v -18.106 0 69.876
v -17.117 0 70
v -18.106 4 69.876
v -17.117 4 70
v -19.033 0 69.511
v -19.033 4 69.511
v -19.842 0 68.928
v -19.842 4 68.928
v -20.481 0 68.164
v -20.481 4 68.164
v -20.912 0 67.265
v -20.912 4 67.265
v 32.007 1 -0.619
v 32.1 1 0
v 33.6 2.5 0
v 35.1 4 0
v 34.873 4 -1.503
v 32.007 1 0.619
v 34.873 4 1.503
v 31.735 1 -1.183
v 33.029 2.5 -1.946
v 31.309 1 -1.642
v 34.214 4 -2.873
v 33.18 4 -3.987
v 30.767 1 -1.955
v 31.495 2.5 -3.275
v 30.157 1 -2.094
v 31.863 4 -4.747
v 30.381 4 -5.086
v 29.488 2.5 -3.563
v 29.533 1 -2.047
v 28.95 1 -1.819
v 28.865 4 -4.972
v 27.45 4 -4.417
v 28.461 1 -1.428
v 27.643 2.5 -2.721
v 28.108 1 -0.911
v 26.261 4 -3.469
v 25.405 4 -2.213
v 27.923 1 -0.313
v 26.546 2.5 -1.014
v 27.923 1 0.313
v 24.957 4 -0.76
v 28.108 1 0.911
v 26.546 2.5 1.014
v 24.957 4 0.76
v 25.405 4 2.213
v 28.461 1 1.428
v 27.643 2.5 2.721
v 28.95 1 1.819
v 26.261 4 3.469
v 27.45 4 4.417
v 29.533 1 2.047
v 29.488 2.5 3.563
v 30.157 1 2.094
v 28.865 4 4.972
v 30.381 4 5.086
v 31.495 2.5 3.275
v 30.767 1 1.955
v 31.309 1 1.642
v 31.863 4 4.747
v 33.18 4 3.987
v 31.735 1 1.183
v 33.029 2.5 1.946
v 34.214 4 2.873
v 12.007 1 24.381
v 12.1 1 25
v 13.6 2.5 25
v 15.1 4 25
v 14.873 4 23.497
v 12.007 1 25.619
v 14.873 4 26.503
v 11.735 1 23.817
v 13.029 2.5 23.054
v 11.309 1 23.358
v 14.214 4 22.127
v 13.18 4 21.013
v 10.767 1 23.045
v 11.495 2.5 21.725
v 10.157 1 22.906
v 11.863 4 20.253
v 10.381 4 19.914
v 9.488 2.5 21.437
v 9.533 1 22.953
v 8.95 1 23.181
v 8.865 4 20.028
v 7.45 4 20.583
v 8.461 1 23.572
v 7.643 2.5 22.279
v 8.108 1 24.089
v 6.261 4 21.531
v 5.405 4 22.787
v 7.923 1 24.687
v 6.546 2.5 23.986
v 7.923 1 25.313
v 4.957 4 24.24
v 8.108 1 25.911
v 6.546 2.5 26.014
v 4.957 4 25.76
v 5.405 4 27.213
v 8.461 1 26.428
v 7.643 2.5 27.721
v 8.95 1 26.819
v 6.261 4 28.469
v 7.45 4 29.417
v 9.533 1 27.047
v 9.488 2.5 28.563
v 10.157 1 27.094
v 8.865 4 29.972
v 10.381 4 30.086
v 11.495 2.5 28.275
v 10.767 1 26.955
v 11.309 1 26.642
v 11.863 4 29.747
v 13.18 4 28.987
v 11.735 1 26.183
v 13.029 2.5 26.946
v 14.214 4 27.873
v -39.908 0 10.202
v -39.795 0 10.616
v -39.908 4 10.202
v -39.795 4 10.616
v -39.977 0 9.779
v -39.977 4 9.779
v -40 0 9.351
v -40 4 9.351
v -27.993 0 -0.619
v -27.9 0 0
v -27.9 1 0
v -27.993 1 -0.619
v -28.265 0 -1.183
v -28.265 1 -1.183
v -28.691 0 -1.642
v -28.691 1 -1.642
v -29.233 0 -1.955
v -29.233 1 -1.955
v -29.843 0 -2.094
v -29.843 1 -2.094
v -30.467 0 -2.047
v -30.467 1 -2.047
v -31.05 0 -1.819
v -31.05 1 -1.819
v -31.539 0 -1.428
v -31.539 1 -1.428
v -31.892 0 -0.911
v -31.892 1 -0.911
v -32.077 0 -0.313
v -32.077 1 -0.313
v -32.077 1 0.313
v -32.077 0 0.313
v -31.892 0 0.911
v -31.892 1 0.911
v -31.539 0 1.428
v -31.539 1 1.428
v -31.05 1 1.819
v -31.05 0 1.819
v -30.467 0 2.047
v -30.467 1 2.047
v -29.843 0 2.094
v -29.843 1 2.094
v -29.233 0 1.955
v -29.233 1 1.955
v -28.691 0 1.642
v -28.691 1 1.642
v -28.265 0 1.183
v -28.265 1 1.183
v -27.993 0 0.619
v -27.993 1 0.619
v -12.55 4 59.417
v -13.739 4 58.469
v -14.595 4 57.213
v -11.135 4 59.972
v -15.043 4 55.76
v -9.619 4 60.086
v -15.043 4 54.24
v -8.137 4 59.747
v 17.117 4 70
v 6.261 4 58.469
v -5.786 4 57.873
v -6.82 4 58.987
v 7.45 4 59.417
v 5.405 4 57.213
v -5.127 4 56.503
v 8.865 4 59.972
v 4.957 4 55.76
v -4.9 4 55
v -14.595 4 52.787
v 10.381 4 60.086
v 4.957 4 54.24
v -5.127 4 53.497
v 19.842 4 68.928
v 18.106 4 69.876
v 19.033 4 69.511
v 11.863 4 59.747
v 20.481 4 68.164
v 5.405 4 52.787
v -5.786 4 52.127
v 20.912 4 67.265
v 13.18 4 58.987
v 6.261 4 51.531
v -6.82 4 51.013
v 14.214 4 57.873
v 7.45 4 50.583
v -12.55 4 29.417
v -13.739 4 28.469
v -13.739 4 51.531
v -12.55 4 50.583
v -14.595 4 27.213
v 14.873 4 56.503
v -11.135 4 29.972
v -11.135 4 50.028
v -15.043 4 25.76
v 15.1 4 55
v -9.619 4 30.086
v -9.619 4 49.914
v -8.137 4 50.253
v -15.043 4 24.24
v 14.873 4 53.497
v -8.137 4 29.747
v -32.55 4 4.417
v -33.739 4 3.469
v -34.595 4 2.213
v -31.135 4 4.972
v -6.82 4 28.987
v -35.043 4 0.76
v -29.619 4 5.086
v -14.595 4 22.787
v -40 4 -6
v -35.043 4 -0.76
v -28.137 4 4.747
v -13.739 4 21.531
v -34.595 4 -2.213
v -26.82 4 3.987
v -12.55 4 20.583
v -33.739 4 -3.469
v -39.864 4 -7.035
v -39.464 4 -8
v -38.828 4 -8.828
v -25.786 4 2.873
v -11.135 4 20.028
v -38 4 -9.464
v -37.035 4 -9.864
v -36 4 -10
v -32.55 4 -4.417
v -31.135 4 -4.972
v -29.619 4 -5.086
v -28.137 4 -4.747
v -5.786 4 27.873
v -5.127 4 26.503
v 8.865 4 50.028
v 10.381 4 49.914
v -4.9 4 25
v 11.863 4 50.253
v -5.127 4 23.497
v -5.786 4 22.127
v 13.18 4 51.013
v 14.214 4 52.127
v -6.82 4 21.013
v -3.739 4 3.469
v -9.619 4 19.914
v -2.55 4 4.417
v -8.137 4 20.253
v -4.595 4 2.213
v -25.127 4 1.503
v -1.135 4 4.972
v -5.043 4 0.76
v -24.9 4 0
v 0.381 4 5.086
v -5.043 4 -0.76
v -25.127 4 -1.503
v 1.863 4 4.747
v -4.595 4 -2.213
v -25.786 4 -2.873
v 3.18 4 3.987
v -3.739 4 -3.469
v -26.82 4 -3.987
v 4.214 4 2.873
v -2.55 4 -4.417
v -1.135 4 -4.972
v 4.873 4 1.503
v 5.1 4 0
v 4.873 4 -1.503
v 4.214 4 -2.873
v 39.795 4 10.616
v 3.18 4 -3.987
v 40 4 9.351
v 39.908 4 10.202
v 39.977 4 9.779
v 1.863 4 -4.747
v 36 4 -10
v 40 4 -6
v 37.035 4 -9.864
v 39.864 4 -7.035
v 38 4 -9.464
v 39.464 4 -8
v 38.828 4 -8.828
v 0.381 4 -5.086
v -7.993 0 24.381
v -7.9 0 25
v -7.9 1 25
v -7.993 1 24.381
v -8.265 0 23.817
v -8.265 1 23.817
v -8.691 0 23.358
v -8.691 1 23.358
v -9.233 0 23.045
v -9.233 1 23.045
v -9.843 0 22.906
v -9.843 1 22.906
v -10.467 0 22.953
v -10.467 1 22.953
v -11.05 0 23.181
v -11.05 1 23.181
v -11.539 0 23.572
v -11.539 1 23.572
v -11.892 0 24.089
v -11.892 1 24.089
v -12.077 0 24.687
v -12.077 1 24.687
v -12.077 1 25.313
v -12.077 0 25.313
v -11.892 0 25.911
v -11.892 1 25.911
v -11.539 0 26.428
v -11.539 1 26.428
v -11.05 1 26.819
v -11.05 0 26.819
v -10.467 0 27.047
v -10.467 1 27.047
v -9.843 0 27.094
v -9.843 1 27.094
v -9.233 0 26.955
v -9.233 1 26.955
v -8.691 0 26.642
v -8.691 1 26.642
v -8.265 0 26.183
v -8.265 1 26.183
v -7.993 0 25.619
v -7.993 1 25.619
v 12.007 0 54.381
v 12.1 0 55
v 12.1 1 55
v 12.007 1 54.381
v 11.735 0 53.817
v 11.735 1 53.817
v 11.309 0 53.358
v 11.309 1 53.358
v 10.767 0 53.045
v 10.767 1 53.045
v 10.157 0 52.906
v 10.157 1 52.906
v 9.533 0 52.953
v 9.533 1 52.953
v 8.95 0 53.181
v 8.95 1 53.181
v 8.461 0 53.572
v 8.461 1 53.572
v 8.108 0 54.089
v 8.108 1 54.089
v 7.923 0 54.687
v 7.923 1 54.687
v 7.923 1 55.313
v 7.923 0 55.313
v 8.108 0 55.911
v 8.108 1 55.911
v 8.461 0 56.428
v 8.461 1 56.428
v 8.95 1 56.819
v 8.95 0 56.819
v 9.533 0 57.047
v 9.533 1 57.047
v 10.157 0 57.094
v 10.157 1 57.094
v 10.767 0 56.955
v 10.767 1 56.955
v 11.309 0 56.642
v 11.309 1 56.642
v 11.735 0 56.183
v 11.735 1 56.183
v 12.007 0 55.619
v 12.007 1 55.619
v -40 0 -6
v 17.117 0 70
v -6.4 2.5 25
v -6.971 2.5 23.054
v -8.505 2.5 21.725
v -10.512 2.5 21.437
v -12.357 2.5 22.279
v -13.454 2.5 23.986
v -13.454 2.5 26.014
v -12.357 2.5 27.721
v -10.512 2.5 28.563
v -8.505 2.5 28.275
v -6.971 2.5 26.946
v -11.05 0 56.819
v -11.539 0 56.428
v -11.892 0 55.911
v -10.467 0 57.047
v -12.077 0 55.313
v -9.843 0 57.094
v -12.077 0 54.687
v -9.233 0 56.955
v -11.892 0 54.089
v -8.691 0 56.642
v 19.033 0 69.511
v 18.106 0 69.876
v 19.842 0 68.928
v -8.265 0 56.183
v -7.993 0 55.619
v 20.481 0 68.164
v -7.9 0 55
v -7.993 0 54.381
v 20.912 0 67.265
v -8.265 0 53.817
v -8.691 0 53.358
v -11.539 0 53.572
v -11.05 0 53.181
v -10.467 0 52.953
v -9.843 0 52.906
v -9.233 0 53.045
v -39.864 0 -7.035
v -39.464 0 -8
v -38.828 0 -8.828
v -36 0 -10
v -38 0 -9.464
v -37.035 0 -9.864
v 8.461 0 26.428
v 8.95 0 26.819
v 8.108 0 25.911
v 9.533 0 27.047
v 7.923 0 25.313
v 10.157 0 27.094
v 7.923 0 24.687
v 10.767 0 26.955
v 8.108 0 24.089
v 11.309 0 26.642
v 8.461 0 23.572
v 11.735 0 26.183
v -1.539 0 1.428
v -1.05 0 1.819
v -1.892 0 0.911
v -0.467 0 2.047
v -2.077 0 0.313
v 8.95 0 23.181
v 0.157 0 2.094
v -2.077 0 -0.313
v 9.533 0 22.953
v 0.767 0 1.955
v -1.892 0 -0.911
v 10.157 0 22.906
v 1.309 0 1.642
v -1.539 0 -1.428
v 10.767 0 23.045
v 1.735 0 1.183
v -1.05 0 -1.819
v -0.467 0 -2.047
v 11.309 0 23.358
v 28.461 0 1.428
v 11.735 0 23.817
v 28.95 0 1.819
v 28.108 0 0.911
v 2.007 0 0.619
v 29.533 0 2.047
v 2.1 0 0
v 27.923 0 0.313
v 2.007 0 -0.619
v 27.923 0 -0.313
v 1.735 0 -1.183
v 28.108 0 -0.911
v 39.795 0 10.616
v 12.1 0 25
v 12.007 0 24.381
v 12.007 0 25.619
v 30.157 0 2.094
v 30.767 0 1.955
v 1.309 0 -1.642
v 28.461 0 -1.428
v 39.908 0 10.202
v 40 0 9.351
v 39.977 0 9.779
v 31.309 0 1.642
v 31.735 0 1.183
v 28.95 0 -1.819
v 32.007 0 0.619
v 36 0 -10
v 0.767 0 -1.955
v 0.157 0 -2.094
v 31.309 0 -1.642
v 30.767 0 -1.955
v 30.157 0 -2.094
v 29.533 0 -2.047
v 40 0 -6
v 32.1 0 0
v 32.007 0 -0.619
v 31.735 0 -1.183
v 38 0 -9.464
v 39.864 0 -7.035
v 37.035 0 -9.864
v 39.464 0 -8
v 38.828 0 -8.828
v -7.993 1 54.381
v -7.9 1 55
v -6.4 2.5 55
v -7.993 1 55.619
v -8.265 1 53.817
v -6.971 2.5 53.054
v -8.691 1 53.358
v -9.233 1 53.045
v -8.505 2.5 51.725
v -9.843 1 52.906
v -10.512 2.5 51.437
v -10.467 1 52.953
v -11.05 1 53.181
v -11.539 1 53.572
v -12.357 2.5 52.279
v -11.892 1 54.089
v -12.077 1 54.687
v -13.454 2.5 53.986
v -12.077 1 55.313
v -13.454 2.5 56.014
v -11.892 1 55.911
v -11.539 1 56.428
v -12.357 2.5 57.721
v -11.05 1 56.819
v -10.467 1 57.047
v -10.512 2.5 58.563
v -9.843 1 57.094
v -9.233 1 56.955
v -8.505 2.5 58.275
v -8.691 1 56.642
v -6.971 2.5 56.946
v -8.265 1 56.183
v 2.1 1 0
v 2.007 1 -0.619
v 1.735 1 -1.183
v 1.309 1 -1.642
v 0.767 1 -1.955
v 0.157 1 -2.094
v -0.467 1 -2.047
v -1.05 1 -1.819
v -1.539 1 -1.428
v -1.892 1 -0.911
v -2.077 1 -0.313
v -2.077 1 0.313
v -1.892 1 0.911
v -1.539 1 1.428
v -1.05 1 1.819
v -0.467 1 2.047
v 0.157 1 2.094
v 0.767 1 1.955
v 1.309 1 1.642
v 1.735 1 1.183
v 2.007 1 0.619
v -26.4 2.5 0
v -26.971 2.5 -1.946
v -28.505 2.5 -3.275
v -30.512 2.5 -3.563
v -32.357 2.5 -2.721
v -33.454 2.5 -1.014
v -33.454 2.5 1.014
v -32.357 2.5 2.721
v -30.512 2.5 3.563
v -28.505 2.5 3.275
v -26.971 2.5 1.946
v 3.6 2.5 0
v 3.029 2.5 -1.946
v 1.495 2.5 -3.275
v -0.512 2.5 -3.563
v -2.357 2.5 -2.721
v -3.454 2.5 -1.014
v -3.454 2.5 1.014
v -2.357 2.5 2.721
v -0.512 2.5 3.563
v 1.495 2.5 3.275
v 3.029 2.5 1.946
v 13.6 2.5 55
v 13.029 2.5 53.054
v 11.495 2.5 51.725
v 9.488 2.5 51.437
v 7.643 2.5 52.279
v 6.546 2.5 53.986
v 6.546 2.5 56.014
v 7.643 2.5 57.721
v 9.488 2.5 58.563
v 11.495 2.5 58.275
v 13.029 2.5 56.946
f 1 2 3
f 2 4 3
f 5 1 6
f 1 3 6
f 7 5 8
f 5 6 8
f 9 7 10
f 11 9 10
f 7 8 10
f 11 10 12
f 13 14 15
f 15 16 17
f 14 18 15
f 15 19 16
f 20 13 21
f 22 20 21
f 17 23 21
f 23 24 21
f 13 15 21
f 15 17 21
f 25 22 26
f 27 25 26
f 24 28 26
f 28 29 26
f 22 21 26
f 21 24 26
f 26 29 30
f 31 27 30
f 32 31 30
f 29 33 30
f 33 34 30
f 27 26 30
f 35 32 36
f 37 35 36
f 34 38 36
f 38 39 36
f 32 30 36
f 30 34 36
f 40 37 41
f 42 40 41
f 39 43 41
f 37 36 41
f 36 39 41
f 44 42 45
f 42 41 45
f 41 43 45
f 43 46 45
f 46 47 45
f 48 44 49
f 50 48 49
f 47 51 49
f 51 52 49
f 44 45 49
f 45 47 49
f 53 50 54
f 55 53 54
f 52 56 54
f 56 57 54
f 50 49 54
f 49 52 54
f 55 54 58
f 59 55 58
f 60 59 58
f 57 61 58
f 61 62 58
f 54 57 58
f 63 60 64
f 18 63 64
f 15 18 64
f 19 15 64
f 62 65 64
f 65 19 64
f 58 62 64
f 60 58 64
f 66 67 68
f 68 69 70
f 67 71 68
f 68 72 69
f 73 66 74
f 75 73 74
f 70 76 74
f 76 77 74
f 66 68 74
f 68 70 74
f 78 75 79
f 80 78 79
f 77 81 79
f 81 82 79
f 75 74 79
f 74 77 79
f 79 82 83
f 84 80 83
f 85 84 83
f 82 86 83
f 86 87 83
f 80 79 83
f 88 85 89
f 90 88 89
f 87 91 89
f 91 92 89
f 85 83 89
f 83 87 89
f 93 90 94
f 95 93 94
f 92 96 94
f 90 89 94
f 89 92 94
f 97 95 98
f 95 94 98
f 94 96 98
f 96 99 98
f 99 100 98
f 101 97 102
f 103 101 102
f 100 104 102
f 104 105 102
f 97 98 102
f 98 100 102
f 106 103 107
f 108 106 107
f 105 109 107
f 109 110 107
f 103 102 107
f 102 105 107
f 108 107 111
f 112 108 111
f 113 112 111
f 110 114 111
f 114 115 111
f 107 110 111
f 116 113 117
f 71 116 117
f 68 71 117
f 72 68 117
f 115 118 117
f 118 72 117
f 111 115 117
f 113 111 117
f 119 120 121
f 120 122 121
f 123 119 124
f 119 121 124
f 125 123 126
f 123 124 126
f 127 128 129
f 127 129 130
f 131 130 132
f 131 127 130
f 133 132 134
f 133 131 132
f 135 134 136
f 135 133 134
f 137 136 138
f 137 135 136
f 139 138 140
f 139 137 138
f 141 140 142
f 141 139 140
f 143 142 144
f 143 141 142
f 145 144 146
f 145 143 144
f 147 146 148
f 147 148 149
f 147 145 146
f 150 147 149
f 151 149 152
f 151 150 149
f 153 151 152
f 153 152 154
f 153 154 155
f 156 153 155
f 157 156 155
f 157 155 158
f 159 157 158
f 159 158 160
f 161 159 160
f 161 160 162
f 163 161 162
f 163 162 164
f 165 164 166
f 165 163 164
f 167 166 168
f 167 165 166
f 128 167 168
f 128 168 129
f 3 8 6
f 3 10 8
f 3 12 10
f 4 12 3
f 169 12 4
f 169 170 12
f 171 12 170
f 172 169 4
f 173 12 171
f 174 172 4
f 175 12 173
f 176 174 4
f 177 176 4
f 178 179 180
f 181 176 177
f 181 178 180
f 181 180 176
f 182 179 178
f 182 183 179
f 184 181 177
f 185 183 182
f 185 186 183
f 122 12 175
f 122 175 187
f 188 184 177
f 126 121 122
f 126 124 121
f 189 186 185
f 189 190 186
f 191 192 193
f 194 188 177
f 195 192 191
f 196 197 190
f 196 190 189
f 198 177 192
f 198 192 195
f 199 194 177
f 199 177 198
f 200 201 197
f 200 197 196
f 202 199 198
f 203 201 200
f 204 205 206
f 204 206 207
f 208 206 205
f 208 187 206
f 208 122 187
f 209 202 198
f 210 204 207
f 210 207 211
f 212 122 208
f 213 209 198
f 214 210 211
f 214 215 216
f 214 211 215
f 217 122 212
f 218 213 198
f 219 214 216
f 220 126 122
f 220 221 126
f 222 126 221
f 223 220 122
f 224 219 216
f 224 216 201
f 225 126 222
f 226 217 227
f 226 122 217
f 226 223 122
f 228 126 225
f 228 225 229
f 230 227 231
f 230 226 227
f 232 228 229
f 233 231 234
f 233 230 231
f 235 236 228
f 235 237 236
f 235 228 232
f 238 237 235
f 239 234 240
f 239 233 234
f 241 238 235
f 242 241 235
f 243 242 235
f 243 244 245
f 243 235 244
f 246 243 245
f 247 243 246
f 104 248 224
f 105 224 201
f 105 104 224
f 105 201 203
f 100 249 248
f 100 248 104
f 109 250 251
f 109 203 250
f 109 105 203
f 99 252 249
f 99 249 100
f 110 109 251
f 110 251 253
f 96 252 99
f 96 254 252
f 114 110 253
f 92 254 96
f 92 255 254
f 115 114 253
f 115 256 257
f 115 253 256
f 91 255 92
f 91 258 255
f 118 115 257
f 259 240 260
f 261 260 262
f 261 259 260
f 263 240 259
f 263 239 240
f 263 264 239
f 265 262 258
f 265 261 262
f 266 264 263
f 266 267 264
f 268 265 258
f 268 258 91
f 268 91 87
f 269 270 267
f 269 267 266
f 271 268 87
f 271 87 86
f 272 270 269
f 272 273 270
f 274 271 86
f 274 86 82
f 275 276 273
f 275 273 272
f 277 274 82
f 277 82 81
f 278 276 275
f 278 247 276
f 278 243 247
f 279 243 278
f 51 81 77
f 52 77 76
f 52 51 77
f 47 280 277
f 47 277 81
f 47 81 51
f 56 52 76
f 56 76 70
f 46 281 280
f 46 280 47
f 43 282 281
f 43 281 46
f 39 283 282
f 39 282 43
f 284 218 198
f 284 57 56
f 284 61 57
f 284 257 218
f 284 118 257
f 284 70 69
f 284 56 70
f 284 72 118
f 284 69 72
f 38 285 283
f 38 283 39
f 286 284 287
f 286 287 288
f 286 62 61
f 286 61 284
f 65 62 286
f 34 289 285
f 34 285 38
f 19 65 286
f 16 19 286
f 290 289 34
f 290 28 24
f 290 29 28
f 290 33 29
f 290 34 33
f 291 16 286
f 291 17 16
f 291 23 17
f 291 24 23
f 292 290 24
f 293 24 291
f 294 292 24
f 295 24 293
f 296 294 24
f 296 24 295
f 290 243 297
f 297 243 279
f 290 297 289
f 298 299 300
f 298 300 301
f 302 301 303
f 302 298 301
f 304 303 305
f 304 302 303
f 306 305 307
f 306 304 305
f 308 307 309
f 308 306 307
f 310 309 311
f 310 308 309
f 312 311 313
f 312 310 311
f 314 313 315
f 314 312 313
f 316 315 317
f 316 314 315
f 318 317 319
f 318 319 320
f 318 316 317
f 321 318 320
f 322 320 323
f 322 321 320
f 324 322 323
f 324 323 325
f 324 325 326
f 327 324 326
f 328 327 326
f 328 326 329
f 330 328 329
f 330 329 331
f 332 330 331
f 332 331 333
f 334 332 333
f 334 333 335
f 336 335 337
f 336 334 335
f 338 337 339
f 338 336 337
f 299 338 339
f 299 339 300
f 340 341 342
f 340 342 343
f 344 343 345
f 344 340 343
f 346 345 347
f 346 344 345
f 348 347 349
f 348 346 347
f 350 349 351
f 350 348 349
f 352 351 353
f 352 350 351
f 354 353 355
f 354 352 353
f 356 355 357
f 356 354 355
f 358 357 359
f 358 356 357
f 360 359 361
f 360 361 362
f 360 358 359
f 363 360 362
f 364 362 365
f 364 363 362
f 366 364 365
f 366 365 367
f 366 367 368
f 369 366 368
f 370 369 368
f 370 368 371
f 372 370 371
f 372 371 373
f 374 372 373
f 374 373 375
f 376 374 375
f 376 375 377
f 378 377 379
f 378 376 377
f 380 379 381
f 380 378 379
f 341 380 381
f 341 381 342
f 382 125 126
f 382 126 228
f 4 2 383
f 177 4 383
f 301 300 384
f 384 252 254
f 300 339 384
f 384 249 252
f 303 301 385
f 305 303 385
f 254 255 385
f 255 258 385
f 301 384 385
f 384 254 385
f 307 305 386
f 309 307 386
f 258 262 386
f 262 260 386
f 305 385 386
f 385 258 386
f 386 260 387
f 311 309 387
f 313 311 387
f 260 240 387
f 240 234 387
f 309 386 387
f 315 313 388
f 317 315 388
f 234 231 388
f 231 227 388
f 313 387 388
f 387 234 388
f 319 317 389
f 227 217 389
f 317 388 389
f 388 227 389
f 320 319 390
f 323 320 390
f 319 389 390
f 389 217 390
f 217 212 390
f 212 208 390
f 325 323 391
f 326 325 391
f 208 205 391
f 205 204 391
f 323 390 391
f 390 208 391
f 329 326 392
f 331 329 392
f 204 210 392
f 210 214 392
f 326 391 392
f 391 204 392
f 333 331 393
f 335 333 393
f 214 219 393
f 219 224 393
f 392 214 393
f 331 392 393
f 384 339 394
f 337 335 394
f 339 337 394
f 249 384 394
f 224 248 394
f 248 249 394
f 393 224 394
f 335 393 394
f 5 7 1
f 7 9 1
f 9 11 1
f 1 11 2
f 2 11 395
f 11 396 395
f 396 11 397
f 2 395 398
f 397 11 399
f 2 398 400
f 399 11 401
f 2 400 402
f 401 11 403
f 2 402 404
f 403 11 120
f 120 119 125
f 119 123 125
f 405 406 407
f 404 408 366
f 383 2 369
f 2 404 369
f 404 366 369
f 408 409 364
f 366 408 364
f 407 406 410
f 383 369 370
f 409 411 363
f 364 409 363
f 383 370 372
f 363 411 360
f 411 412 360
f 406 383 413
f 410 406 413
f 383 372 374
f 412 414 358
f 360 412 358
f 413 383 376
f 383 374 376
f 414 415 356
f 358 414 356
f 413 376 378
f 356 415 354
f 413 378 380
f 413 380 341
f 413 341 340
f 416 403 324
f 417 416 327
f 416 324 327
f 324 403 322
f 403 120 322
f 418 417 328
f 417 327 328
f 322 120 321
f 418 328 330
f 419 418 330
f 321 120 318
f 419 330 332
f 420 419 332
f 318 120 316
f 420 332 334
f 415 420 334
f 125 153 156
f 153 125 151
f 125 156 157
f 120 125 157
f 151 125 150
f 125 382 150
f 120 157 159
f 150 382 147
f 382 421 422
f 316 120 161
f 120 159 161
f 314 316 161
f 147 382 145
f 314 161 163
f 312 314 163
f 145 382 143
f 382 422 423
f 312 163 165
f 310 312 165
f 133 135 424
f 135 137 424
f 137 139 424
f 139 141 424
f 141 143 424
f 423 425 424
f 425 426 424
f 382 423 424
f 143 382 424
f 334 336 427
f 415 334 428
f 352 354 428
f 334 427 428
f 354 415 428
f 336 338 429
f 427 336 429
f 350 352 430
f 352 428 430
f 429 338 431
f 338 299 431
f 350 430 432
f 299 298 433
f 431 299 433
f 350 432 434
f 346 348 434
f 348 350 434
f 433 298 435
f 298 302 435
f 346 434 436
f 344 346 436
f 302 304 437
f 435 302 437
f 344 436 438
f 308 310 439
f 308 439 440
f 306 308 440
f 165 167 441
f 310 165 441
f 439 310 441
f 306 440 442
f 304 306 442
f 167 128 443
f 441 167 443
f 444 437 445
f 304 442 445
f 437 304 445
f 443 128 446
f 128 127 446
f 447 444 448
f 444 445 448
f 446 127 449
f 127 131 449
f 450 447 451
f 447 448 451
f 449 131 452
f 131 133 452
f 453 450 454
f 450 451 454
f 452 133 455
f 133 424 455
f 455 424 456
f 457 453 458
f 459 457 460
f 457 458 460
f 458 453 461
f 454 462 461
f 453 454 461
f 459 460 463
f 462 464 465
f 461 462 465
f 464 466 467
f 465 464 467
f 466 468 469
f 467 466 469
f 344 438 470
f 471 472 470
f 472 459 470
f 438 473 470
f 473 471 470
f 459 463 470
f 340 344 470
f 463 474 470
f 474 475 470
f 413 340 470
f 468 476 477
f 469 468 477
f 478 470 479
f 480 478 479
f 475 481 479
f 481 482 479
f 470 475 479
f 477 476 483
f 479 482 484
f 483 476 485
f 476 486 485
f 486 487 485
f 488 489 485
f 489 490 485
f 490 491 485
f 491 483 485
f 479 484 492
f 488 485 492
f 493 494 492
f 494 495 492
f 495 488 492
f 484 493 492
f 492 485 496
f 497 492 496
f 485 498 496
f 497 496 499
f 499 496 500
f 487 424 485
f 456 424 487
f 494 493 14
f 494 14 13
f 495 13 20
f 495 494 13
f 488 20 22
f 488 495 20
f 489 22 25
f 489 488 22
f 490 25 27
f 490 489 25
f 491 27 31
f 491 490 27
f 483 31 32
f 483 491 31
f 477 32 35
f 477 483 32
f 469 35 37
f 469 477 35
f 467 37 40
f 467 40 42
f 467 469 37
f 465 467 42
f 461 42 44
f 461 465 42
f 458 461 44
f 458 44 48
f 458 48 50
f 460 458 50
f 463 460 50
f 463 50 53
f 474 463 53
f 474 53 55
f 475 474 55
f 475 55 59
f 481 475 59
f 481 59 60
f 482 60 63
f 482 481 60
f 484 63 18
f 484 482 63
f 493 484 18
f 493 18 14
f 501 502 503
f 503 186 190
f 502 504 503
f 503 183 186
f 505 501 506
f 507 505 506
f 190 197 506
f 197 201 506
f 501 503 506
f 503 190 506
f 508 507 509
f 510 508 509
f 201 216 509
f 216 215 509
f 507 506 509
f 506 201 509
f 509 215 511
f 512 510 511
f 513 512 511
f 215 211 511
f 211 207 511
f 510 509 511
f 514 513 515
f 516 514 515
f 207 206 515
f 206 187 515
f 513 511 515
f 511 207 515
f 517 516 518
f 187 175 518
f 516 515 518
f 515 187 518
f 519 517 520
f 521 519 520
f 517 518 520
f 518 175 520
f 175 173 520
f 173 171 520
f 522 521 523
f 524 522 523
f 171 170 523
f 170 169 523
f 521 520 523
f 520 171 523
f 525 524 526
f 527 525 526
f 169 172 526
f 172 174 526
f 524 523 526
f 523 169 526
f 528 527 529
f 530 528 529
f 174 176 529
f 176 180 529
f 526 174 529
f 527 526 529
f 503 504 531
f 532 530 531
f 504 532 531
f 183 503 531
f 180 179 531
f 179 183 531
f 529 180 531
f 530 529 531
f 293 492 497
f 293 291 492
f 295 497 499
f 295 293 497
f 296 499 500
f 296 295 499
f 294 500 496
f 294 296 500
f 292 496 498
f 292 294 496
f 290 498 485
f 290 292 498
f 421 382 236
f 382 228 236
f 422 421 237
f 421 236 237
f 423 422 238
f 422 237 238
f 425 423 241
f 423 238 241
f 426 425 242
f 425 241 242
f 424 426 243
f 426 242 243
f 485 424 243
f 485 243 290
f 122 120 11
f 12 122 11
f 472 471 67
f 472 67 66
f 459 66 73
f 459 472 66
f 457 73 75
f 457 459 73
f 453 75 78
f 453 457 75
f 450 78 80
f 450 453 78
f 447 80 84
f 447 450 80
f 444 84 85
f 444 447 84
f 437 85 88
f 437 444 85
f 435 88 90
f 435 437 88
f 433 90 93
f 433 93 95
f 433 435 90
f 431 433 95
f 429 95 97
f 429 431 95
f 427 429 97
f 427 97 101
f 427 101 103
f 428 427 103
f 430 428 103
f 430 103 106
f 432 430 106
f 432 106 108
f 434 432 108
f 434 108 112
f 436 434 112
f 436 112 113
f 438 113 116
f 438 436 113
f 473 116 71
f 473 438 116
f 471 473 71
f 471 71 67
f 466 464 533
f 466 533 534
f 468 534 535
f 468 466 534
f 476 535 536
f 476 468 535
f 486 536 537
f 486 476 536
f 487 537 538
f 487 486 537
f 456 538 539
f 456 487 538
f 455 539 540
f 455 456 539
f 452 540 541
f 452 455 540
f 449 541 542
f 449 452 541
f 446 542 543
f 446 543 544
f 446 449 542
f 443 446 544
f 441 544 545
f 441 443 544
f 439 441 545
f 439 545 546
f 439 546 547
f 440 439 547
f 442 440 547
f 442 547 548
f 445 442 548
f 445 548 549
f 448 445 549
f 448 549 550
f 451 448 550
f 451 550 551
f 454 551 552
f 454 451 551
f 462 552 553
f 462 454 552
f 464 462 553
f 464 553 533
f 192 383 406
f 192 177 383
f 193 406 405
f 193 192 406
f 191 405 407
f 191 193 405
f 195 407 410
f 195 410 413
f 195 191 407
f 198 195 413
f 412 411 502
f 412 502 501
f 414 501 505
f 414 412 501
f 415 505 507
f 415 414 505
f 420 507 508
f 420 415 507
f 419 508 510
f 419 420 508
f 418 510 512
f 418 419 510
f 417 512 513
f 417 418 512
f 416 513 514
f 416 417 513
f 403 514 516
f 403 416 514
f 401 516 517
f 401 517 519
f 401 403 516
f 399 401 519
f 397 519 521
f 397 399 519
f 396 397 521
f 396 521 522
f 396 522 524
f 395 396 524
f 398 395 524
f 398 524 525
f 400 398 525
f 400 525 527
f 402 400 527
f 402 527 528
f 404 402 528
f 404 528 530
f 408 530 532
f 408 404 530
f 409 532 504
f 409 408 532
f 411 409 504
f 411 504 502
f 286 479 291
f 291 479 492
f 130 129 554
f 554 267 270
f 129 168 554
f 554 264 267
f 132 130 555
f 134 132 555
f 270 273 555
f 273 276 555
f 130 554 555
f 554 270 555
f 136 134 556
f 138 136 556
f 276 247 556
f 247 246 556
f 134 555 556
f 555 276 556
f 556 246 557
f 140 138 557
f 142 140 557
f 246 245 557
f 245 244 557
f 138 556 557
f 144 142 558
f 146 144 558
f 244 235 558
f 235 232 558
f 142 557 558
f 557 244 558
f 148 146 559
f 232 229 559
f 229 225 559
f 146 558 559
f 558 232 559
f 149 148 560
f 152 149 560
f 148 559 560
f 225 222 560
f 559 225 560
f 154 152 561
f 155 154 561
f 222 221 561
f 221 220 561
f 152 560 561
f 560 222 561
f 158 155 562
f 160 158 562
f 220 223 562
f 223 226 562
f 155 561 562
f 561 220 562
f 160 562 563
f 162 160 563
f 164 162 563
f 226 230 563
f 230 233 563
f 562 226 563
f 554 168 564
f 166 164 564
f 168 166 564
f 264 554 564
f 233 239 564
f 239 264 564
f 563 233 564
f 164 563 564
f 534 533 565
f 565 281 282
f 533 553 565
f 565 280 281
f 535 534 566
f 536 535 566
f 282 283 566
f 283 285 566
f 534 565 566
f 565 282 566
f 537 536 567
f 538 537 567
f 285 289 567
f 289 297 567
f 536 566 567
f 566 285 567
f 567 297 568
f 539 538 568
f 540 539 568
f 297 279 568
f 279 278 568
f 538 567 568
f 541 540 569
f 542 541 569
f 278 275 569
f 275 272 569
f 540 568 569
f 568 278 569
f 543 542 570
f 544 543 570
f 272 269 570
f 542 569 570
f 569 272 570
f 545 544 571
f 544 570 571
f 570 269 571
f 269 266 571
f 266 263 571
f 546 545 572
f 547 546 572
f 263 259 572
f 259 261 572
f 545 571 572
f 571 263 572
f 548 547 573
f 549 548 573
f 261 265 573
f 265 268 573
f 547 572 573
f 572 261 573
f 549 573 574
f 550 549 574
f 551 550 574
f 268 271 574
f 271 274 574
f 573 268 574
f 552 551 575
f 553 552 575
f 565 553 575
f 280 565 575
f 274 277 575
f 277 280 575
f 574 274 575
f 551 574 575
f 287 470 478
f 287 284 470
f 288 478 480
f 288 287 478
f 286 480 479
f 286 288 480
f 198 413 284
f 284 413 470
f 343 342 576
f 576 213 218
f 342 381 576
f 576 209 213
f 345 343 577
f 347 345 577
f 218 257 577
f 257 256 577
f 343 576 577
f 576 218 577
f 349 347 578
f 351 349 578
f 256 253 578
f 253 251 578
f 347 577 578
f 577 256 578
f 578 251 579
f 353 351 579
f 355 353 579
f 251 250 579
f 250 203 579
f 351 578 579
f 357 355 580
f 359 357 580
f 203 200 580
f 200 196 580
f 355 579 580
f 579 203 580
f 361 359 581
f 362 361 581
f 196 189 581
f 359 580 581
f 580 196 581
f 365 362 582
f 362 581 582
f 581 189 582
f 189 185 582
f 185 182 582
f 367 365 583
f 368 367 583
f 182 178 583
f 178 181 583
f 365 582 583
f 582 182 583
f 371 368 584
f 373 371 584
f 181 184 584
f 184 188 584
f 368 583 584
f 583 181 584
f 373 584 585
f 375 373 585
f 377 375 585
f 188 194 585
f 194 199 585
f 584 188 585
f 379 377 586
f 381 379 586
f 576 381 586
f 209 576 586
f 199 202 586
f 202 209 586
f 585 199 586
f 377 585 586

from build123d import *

# Parameters (mm, degrees)
SKETCH1_W           = 40
SKETCH1_H           = 60
SKETCH1_R           = 2.1
SKETCH1_W_2         = 80
SKETCH1_H_2         = 20
BOSS_EXTRUDE1_DEPTH = 4
CHAMFER1_SIZE       = 3
FILLET1_R           = 4


with BuildPart() as part:
    # Sketch1 → Boss-Extrude1 (new body)
    with BuildSketch(Plane(origin=(0, 0, 0), x_dir=(1, 0, 0), z_dir=(0, 1, 0))):
        with Locations((0, -40)):
            Rectangle(SKETCH1_W, SKETCH1_H)
        with Locations((-10, -55)):
            Circle(SKETCH1_R, mode=Mode.SUBTRACT)
        with Locations((10, -55)):
            Circle(SKETCH1_R, mode=Mode.SUBTRACT)
        with Locations((-10, -25)):
            Circle(SKETCH1_R, mode=Mode.SUBTRACT)
        with Locations((10, -25)):
            Circle(SKETCH1_R, mode=Mode.SUBTRACT)
        Polygon((-20, -10), (-40, -10), (-20, -70), align=None)
        Polygon((40, -10), (20, -10), (20, -70), align=None)
        Rectangle(SKETCH1_W_2, SKETCH1_H_2)
        Circle(SKETCH1_R, mode=Mode.SUBTRACT)
        with Locations((30, 0)):
            Circle(SKETCH1_R, mode=Mode.SUBTRACT)
        with Locations((-30, 0)):
            Circle(SKETCH1_R, mode=Mode.SUBTRACT)
    extrude(amount=BOSS_EXTRUDE1_DEPTH)

    # Chamfer1
    chamfer1_edges = [part.edges().sort_by_distance(p)[0] for p in [
        (-12.1, 4, 55),
        (7.9, 4, 55),
        (7.9, 4, 25),
        (-12.1, 4, 25),
        (-2.1, 4, 0),
        (27.9, 4, 0),
        (-32.1, 4, 0),
    ]]
    chamfer(chamfer1_edges, length=CHAMFER1_SIZE)

    # Fillet1
    fillet1_edges = [part.edges().sort_by_distance(p)[0] for p in [
        (20, 2, 70),
        (-20, 2, 70),
        (-40, 2, 10),
        (-40, 2, -10),
        (40, 2, -10),
        (40, 2, 10),
    ]]
    fillet(fillet1_edges, radius=FILLET1_R)


solid = part.part
